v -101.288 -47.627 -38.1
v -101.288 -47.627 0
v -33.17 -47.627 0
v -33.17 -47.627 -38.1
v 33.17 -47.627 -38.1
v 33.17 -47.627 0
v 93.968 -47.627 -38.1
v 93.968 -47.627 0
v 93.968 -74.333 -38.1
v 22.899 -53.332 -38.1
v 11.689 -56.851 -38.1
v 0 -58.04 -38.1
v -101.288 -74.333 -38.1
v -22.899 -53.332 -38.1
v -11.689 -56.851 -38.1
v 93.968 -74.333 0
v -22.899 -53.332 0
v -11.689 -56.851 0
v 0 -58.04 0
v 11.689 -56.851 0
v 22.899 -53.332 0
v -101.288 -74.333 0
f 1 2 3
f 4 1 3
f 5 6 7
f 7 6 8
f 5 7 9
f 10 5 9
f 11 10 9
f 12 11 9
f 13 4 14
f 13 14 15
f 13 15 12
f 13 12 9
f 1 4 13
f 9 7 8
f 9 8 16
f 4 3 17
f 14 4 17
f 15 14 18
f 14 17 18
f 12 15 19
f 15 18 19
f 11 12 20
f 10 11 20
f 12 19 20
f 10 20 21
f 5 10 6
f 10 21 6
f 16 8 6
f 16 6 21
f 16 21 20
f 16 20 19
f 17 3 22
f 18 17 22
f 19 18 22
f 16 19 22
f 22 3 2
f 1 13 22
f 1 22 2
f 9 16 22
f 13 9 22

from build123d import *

# Parameters (mm, degrees)
BOSS_EXTRUDE1_DEPTH = 38.1


with BuildPart() as part:
    # Sketch1 → Boss-Extrude1 (new body)
    with BuildSketch(Plane.XY):
        with BuildLine():
            Line((33.170312314, -47.627428872), (93.967860133, -47.627428872))
            Line((93.967860133, -47.627428872), (93.967860133, -74.332818087))
            Line((93.967860133, -74.332818087), (-101.288011779, -74.332818087))
            Line((-101.288011779, -74.332818087), (-101.288011779, -47.627428872))
            Line((-101.288011779, -47.627428872), (-33.170312314, -47.627428872))
            ThreePointArc((-33.170312314, -47.627428872), (0, -58.04), (33.170312314, -47.627428872))
        make_face()
    extrude(amount=-BOSS_EXTRUDE1_DEPTH)


solid = part.part
